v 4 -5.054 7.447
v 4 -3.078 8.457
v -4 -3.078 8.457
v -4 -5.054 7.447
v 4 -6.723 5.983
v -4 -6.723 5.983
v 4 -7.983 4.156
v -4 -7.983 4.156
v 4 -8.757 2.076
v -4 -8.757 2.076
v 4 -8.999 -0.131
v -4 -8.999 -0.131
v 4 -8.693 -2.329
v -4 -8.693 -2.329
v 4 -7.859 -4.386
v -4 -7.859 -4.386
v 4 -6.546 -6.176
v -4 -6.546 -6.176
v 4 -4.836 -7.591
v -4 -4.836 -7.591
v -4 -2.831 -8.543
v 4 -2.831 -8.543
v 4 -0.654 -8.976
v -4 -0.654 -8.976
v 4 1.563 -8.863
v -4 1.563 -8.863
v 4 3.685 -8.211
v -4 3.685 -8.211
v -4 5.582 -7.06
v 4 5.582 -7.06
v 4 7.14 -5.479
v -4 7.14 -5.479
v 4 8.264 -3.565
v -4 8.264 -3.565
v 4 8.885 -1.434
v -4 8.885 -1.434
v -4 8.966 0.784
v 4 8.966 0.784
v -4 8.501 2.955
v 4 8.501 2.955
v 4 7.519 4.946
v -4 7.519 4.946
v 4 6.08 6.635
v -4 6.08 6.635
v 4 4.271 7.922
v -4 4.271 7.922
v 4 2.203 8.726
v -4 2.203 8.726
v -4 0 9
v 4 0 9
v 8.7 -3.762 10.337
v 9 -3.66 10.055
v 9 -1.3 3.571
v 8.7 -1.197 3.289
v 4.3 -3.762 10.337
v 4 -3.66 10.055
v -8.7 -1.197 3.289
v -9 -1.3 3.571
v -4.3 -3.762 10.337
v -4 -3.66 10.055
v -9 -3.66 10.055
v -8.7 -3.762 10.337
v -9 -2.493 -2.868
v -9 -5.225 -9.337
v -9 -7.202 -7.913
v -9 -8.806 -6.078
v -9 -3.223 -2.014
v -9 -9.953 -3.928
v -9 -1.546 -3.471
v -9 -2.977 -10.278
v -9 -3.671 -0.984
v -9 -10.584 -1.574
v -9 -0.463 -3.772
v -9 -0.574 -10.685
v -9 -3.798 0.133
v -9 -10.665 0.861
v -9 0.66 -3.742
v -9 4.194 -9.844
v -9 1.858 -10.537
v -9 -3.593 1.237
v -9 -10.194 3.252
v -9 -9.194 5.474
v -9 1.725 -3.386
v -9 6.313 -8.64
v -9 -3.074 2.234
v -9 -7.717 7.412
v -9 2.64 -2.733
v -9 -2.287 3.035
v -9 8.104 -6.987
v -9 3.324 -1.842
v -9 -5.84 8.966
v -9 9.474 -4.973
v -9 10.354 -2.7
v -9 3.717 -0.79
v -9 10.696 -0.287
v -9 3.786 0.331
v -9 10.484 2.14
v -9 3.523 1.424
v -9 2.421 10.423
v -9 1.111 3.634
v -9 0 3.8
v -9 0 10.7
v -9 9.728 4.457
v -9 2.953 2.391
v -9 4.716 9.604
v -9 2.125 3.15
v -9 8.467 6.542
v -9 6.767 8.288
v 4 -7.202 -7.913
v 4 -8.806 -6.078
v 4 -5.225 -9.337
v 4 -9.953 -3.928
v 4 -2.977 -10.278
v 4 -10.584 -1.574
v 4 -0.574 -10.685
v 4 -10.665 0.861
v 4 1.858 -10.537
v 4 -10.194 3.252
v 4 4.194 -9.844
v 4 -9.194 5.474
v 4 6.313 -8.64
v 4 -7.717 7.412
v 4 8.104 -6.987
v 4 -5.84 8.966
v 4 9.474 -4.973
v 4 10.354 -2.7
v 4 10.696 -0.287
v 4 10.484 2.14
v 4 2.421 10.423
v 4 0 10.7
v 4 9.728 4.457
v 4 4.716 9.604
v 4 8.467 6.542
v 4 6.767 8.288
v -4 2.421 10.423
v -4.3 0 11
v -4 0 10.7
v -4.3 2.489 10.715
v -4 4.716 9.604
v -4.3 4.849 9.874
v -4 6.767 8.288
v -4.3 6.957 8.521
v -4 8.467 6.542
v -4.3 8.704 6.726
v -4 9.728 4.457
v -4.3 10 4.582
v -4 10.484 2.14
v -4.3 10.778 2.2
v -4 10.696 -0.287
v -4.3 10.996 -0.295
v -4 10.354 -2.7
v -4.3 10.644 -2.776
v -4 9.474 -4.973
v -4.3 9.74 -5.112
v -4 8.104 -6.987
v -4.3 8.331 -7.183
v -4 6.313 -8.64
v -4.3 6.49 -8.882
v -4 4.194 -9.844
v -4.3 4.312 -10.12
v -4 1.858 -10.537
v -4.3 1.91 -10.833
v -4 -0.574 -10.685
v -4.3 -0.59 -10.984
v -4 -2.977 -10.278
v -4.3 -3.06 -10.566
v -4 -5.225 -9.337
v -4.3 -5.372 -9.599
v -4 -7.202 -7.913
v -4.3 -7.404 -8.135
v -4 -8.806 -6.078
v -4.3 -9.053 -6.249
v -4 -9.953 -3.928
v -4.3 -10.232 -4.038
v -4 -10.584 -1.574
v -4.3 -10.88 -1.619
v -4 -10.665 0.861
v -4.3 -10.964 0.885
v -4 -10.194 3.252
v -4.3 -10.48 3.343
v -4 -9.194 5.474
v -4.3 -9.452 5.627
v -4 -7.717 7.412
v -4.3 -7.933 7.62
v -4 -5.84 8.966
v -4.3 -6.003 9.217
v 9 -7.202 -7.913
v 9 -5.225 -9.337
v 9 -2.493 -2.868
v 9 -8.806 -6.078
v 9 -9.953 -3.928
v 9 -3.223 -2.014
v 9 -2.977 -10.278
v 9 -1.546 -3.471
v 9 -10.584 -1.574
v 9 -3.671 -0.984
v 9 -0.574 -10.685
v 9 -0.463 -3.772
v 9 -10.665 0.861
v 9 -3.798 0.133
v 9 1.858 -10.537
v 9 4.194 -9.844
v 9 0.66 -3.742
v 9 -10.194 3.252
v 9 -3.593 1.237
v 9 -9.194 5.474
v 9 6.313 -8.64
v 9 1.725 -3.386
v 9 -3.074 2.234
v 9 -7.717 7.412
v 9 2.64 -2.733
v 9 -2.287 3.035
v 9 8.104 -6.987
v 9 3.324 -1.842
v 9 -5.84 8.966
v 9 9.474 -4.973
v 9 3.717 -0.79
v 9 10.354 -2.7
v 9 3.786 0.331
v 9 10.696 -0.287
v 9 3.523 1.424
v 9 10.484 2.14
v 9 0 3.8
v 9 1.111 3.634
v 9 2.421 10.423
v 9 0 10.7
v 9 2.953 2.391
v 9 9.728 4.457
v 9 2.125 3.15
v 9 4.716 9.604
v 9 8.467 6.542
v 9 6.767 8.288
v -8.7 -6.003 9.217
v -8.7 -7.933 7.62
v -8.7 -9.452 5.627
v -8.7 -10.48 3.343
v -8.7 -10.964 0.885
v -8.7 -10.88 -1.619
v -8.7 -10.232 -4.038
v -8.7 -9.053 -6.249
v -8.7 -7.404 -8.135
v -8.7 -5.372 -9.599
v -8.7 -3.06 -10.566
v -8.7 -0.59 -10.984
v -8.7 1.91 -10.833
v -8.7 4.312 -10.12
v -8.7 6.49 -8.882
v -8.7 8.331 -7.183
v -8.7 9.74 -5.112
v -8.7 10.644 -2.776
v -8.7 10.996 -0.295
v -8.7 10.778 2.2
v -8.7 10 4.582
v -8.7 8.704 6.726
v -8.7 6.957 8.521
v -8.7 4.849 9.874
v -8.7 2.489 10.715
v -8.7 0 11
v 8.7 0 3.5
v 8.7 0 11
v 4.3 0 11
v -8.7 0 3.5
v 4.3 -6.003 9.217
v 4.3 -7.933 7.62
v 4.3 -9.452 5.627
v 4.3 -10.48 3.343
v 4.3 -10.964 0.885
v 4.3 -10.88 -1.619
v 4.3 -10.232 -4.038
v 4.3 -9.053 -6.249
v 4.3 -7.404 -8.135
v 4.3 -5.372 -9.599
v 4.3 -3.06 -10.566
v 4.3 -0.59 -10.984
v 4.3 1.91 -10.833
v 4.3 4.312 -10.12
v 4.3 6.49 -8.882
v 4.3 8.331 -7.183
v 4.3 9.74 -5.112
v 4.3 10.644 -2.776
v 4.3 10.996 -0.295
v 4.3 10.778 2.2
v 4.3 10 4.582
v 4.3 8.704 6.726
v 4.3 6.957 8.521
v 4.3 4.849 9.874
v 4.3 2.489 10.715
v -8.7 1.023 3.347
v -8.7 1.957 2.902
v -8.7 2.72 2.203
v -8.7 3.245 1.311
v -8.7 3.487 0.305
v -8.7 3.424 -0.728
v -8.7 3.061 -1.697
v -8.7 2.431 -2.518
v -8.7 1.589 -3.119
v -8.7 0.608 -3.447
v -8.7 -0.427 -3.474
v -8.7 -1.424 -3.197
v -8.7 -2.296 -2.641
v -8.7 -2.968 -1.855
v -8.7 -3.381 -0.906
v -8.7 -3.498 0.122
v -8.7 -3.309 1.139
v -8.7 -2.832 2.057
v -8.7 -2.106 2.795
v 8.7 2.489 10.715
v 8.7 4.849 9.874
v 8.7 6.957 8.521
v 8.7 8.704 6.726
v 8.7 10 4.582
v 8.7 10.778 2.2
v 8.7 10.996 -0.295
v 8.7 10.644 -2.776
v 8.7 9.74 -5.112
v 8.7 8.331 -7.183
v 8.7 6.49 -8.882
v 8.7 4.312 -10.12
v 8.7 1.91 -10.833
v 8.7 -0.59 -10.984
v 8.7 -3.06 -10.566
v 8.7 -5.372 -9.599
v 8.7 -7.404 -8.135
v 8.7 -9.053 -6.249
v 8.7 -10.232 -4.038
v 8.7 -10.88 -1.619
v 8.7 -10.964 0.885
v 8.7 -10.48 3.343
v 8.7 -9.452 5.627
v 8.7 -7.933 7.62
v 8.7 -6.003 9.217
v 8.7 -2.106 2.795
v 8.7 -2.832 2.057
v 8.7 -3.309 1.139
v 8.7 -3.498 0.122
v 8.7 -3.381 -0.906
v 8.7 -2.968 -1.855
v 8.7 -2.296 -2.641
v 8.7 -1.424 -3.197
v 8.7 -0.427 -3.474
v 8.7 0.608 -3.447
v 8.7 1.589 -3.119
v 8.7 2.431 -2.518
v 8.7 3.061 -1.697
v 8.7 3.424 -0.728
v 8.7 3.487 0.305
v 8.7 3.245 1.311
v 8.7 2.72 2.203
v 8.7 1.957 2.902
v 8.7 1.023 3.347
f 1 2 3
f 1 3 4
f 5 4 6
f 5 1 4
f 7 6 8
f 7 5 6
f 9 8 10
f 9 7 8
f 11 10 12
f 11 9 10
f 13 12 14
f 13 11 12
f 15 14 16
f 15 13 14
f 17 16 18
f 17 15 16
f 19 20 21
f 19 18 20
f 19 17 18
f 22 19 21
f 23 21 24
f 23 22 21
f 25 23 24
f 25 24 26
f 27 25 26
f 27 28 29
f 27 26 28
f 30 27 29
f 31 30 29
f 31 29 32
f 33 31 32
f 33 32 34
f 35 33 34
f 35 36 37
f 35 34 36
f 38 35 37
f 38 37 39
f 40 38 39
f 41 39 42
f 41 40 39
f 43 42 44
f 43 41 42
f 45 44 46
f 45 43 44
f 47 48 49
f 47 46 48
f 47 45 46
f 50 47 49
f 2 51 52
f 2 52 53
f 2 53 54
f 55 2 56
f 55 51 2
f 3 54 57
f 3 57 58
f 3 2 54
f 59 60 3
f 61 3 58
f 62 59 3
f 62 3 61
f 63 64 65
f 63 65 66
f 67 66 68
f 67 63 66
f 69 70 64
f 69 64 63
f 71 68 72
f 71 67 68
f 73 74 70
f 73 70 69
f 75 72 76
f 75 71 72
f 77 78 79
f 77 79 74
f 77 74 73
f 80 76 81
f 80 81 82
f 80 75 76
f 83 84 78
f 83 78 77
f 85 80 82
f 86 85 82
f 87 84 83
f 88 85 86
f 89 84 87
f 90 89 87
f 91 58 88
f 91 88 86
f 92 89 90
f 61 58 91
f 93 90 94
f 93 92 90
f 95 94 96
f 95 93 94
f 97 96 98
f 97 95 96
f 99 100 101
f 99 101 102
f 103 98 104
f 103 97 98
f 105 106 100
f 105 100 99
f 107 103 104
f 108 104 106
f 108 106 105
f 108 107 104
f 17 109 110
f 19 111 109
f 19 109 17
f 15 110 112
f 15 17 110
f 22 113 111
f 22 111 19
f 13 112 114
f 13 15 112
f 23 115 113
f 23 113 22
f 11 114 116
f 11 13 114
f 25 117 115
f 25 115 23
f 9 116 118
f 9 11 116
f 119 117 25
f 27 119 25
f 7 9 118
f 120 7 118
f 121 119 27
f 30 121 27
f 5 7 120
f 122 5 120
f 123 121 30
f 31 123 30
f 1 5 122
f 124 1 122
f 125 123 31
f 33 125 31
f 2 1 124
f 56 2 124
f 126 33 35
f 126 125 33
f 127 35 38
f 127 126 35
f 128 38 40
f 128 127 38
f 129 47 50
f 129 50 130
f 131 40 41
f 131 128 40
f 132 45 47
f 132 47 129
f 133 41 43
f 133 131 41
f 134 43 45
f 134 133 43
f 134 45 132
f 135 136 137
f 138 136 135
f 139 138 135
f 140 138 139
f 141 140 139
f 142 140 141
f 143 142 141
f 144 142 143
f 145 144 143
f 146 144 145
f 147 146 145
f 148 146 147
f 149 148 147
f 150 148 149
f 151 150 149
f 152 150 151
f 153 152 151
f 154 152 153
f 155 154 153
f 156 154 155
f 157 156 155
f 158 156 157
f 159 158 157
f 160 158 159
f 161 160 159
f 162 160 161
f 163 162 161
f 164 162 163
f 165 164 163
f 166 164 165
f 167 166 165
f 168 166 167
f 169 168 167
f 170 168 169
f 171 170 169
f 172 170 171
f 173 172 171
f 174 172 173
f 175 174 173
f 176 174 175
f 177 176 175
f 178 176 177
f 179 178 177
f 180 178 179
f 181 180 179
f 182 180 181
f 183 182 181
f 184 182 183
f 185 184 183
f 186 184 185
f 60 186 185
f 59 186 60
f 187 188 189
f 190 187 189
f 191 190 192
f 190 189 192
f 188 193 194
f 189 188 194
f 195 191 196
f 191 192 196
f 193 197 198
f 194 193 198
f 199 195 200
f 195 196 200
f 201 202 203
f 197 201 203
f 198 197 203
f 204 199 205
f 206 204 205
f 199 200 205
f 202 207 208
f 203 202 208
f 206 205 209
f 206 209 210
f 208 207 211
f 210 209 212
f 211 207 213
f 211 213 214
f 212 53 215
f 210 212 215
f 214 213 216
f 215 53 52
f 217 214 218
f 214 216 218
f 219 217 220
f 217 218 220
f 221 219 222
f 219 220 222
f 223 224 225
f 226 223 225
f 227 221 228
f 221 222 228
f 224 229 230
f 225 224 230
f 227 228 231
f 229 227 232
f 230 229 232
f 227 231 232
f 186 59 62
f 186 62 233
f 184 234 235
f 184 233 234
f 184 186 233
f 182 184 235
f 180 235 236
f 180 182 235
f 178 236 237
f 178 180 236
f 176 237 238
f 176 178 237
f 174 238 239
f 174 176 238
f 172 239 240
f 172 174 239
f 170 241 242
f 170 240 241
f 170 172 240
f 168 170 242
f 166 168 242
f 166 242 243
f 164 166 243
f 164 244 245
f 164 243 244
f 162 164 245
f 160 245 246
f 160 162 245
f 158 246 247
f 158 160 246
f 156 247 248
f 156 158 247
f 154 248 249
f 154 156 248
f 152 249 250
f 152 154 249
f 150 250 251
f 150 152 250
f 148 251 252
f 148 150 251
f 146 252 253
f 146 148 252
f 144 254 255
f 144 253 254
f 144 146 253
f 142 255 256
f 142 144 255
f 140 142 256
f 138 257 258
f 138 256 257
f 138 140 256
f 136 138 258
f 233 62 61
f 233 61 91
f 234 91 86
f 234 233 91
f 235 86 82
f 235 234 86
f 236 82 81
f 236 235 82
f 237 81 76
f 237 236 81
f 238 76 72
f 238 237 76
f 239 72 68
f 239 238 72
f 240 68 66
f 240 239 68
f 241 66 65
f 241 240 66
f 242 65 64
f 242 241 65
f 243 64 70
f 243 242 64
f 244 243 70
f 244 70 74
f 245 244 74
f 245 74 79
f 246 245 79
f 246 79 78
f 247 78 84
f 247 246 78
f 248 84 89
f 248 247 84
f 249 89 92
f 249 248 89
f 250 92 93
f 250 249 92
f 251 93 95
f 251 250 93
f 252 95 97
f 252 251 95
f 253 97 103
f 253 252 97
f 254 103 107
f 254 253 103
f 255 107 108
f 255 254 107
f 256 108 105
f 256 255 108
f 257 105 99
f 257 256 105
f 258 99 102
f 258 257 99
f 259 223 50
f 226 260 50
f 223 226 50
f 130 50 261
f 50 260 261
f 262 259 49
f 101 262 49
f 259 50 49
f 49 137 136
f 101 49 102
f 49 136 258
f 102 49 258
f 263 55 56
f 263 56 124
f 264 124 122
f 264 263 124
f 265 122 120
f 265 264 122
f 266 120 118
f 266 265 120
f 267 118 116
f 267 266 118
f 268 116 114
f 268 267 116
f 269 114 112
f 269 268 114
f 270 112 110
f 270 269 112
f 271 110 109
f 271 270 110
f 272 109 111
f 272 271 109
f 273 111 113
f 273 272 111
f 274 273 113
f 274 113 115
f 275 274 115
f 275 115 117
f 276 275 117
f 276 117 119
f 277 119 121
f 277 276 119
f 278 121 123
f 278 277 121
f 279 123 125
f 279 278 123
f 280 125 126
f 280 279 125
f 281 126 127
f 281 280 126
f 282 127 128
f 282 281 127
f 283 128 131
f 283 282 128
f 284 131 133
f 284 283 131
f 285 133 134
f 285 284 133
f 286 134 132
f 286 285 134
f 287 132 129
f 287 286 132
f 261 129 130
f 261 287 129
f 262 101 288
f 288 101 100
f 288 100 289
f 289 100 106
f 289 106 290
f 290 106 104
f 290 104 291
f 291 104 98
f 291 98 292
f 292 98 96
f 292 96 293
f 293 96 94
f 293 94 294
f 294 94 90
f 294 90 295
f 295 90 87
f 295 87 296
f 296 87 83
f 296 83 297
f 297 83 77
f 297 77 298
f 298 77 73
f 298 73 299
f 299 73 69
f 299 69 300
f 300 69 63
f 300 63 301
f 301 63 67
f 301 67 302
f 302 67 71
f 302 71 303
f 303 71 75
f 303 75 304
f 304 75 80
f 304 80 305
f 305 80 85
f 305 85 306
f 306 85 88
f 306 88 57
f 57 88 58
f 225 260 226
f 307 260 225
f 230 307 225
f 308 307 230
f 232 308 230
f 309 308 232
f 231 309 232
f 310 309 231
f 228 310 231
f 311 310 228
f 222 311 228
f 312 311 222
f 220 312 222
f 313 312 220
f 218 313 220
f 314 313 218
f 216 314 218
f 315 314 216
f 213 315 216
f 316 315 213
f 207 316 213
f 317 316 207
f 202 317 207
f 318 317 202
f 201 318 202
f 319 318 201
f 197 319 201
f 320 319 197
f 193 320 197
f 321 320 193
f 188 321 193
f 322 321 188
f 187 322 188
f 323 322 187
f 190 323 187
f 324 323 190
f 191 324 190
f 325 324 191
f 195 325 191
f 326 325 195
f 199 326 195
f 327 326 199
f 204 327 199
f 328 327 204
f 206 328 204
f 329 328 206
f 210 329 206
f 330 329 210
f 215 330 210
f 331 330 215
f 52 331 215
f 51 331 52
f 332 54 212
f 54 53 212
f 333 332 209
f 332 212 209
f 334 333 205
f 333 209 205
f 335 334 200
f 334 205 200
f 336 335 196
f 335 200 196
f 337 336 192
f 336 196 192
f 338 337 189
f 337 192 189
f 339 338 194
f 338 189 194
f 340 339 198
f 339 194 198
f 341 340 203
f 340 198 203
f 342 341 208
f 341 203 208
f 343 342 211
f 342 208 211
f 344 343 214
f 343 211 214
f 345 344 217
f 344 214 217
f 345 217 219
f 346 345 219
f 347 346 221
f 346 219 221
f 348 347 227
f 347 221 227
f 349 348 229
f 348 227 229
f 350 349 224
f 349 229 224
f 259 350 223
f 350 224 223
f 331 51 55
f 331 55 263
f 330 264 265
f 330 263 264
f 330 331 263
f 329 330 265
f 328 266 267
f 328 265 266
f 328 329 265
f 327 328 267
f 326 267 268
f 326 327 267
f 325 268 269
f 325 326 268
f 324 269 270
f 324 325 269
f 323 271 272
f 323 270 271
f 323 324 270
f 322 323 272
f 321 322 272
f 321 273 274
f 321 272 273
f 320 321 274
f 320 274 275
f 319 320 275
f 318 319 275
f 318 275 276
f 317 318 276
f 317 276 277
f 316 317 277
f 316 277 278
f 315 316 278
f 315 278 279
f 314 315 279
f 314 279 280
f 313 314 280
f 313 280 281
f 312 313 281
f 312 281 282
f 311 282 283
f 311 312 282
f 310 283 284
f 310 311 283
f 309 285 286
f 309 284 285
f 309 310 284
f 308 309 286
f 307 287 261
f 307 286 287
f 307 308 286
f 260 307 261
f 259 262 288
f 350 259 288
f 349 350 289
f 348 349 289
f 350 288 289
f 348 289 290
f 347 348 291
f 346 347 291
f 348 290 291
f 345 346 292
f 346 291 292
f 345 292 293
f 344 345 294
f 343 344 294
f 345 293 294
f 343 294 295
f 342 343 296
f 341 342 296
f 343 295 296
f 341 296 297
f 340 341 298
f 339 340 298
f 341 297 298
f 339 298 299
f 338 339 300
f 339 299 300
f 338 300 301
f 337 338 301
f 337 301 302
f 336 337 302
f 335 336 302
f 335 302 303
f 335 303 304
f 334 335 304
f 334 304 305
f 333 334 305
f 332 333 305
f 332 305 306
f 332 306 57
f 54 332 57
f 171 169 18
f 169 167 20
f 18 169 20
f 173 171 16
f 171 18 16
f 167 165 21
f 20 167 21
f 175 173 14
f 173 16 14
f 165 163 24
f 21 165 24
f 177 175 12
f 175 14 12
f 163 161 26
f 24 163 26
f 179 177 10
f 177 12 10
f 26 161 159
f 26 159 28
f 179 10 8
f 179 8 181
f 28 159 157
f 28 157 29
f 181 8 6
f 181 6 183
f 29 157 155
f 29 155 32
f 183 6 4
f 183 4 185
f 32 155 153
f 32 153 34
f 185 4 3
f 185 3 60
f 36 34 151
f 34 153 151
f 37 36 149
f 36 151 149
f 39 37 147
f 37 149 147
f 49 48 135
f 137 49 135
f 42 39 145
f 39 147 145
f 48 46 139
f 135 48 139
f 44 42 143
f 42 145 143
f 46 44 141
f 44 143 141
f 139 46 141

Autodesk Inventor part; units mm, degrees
ref_plane "YZ Plane" through (0, 0, 0) normal (1, 0, 0) x (0, 1, 0)
ref_plane "XZ Plane" through (0, 0, 0) normal (0, 1, 0) x (-1, 0, 0)
ref_plane "XY Plane" through (0, 0, 0) normal (0, 0, 1) x (1, 0, 0)
sketch "Sketch1" plane through (0, 0, 0) normal (0, 1, 0) x (-1, 0, 0)
  line L0 (-9, 0) -> (9, 0)
  line L1 (-9, 3.5) -> (9, 3.5)
  line L2 (9, 3.5) -> (9, 11)
  line L3 (9, 11) -> (4, 11)
  line L4 (4, 11) -> (4, 9)
  line L5 (4, 9) -> (-4, 9)
  line L6 (-4, 9) -> (-4, 11)
  line L7 (-4, 11) -> (-9, 11)
  line L8 (-9, 11) -> (-9, 3.5)
  point P0 (0, 0)
  point P1 (0, 9)
  point P2 (0, 3.5)
  dimension "d0" = 18
  dimension "d1" = 8
  dimension "d2" = 7
  dimension "d3" = 22
  dimension "d4" = 2
revolve "Revolution1" add sketch "Sketch1" angle 340 about axis through (9, 0, 0) along (-1, 0, 0)
chamfer "Chamfer1" distance 0.3 angle 45 6 edges at (-4, 1.9101, -10.8329) (4, 1.9101, -10.8329) (9, 1.9101, -10.8329) (-9, 1.9101, -10.8329) (9, 0.6078, -3.4468) (-9, 0.6078, -3.4468)
properties part number "coupling_tie" material "ABS Plastic"
